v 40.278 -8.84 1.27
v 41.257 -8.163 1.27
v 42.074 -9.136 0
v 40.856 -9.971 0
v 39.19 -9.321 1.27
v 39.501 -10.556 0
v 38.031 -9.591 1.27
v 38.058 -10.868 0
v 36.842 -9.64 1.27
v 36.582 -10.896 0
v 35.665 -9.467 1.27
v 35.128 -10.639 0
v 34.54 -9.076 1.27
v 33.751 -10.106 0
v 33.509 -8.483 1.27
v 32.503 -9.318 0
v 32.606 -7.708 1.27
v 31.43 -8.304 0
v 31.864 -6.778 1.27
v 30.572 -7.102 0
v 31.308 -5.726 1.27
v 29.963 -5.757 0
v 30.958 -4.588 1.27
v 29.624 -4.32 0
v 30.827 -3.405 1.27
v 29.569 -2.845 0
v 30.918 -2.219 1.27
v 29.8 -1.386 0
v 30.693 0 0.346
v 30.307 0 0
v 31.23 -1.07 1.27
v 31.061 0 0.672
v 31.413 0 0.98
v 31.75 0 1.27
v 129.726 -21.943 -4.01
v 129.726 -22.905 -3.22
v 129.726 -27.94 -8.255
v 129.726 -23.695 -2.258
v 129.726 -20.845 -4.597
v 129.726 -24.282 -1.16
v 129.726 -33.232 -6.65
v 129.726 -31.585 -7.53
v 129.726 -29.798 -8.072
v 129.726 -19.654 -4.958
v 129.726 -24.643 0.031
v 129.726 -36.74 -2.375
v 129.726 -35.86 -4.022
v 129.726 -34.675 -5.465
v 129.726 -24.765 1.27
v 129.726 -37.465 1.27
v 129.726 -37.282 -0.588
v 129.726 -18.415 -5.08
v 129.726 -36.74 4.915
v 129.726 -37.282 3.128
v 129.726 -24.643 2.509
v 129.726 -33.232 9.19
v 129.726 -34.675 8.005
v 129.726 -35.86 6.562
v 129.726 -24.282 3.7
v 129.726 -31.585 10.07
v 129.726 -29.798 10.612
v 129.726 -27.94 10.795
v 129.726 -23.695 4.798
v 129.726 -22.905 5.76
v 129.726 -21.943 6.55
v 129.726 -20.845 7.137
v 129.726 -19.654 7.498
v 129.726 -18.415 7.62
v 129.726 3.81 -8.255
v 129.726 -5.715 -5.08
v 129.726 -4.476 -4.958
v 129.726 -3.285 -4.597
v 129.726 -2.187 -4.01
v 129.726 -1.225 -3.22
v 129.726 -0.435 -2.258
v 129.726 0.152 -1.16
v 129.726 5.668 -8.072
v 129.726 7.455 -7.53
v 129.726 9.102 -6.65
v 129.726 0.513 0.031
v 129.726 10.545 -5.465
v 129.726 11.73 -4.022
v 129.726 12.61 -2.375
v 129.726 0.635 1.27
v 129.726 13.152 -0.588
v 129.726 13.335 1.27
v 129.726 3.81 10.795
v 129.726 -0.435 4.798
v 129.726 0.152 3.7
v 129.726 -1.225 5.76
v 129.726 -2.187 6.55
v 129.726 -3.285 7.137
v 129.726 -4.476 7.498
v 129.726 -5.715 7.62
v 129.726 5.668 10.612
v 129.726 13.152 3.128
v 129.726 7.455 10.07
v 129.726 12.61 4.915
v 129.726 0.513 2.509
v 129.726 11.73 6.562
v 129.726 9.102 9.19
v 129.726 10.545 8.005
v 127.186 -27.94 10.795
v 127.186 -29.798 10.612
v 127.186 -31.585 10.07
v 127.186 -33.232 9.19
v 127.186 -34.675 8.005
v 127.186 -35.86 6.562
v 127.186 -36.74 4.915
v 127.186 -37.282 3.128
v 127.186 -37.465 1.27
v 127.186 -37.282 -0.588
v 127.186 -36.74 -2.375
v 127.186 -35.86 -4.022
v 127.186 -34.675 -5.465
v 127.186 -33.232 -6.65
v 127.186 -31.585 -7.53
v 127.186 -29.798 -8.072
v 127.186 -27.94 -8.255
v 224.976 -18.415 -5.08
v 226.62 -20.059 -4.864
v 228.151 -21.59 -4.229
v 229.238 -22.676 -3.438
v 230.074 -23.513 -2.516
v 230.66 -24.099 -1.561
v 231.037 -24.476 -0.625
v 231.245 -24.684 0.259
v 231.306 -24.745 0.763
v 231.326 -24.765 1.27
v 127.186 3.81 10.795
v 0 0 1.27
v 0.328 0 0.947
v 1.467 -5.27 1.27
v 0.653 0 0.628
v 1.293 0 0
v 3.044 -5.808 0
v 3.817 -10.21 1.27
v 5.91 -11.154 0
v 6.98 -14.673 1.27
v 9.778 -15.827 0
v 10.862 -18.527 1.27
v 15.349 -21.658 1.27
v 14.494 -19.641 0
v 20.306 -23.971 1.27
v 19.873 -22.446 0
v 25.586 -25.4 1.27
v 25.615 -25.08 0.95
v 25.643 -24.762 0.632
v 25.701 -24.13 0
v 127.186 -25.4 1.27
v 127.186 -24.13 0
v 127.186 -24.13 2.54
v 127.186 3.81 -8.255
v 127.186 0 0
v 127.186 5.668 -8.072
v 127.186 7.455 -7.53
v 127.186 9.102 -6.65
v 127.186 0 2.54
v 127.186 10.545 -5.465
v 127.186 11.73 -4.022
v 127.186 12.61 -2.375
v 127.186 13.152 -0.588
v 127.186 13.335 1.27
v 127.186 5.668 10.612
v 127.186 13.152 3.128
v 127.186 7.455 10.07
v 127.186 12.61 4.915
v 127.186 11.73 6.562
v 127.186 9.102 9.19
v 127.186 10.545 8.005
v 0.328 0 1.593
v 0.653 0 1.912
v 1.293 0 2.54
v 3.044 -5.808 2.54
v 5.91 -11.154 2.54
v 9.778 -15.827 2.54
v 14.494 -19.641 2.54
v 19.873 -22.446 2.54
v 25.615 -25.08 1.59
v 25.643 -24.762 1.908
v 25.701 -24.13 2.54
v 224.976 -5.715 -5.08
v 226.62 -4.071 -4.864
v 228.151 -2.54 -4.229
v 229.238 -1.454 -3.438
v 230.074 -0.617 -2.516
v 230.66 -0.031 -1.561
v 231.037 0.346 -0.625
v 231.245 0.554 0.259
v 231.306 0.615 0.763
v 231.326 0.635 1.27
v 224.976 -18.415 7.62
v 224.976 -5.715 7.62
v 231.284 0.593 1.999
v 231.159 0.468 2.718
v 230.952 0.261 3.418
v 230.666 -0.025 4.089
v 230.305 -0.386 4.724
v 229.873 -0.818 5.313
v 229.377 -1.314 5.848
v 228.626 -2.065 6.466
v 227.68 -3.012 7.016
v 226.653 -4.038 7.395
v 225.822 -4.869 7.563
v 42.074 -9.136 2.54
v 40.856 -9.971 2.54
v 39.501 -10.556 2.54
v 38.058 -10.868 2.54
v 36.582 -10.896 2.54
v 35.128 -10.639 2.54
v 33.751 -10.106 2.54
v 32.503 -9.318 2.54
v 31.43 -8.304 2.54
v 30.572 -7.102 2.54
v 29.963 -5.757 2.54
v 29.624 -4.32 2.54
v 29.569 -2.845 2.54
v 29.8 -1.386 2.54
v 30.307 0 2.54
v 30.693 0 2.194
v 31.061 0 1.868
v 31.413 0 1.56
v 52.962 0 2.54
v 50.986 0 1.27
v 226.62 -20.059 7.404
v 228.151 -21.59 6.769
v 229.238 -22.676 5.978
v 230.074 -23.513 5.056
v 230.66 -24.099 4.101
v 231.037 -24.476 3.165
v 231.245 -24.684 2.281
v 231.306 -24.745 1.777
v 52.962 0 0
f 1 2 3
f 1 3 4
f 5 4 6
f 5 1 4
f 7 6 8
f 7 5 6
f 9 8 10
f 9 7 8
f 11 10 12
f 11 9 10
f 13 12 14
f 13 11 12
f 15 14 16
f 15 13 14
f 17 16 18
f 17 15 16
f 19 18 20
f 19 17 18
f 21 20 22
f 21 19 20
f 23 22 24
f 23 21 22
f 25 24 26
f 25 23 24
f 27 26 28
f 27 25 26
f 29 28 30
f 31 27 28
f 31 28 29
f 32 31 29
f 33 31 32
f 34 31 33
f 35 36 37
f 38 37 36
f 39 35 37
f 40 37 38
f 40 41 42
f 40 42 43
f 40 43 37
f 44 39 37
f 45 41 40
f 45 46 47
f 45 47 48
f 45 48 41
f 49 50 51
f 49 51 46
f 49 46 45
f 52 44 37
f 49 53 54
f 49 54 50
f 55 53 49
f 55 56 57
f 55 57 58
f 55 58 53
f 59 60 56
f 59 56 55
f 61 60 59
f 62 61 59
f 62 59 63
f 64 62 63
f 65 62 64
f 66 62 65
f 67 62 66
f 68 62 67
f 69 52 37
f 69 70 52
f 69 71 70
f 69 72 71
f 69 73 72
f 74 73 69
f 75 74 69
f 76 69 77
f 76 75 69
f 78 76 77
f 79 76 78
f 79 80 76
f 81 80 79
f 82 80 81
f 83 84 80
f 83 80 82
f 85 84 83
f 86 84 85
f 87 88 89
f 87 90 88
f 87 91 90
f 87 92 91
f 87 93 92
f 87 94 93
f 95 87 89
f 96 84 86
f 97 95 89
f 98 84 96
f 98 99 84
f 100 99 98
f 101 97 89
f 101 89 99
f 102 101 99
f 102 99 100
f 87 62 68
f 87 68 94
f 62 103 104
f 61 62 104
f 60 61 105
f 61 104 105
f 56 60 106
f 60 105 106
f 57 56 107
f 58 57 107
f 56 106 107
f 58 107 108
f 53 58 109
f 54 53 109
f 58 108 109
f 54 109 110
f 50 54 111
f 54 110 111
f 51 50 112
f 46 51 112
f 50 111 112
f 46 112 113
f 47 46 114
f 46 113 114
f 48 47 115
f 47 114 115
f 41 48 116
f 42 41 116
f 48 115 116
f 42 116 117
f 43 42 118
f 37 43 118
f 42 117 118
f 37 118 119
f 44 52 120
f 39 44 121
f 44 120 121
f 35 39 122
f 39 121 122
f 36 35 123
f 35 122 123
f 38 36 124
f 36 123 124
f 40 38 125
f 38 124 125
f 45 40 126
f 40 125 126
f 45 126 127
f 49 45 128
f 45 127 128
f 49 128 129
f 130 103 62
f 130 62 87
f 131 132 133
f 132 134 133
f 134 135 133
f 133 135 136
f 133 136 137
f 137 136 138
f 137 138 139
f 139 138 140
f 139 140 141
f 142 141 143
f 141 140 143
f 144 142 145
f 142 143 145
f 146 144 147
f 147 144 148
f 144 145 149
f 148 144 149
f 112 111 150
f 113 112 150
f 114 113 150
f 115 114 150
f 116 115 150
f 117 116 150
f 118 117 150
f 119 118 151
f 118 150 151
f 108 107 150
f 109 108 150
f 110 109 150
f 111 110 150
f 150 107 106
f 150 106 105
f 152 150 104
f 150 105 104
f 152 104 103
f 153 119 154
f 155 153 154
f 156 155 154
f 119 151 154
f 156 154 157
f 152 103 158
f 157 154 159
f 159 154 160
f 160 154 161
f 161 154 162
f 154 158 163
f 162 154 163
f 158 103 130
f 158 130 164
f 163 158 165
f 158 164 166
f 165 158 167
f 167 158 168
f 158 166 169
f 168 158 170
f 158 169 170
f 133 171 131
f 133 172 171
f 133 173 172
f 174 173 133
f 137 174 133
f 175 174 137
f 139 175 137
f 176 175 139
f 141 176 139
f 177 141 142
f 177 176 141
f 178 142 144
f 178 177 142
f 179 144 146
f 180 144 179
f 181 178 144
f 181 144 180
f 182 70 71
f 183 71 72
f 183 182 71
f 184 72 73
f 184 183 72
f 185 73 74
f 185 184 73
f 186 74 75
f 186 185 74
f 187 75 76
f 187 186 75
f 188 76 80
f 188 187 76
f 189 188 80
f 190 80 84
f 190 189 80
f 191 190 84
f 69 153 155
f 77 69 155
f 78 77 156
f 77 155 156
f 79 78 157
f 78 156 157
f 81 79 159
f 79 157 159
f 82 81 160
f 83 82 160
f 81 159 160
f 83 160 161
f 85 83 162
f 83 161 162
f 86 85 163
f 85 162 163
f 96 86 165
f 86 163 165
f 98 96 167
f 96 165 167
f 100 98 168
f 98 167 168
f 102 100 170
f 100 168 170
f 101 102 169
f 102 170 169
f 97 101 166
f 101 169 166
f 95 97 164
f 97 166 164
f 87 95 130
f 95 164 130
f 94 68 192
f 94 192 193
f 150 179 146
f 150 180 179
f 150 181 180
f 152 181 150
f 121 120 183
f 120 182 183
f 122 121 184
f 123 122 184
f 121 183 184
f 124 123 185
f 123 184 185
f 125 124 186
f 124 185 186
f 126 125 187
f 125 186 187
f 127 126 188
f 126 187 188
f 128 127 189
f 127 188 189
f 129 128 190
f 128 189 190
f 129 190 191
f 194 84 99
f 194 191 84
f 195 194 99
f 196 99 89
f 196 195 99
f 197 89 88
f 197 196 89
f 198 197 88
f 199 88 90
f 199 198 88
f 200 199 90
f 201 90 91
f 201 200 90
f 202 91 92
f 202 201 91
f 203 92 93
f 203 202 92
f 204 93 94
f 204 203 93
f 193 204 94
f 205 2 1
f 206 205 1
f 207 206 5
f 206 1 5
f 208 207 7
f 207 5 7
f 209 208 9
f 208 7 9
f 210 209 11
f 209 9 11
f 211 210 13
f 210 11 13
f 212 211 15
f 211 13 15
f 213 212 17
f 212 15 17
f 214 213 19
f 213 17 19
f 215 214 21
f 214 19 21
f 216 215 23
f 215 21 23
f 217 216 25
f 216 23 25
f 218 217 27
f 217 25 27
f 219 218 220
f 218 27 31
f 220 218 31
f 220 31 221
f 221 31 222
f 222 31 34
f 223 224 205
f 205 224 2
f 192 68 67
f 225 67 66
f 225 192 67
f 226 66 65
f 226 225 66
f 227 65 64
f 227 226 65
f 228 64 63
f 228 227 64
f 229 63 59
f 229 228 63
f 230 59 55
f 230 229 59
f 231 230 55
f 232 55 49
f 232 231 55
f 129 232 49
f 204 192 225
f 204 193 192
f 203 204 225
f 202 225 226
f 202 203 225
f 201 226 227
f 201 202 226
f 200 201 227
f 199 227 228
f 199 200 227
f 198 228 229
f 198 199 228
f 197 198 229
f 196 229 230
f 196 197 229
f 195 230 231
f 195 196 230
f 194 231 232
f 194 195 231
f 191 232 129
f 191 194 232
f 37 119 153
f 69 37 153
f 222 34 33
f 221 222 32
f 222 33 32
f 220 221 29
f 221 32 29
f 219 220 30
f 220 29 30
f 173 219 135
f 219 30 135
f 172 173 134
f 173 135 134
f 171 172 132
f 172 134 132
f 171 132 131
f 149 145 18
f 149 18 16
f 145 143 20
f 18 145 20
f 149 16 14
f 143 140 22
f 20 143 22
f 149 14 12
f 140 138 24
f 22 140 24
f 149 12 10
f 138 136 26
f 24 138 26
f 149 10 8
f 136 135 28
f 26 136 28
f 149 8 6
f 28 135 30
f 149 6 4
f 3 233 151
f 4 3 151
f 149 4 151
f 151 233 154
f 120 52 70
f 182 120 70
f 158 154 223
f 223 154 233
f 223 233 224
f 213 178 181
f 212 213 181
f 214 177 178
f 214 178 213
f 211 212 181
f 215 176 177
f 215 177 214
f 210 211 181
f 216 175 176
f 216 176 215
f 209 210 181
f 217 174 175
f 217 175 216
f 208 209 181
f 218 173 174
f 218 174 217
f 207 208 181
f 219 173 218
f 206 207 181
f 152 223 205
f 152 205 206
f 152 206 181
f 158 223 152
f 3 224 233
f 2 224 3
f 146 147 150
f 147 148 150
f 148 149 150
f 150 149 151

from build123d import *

# Parameters (mm, degrees)
F1_DEPTH   = 2.54
F2_C1_SIZE = 1.27
F2_C2_SIZE = 1.2699
F2_C3_SIZE = 1.27
F2_C4_SIZE = 1.2699
F3_SIZE    = 1.26999
F4_W       = 31.75
F4_H       = 19.05
F5_DEPTH   = 2.54
F6_W       = 25.4
F6_H       = 12.7
F7_DEPTH   = 101.6
F8_R       = 6.34999


# Not quite as in the source:
# - a fillet or chamfer is up to 0.001 mm smaller than in the source, because OpenCascade refuses the exact size


with BuildPart() as f1:
    # F0 (on Top) → F1 (new body)
    with BuildSketch(Plane.XY):
        with BuildLine():
            Line((31.75, 0), (0, 0))
            ThreePointArc((0, 0), (8.8381906554, -16.6839242395), (25.5862342852, -25.4))
            Line((25.5862342852, -25.4), (127.1862342852, -25.4))
            Line((127.1862342852, -25.4), (127.1862342852, 0))
            Line((127.1862342852, 0), (50.9862342852, 0))
            Line((50.9862342852, 0), (41.2574698576, -8.163402643))
            ThreePointArc((41.2574698576, -8.163402643), (33.0391135049, -8.1167569468), (31.75, 0))
        make_face()
    extrude(amount=F1_DEPTH)

    # F2: chamfer of 1.27 on 4 edges, made by hand

    # F2_c1
    f2_c1_edges = [f1.edges().sort_by_distance(p)[0] for p in [
        (76.3862342852, -25.4, 0),
    ]]
    chamfer(f2_c1_edges, length=F2_C1_SIZE)

    # F2_c2 (size 1.27 in the source; OpenCascade refuses exactly that, so slightly less here)
    f2_c2_edges = [f1.edges().sort_by_distance(p)[0] for p in [
        (76.3862342852, -25.4, 2.54),
    ]]
    chamfer(f2_c2_edges, length=F2_C2_SIZE)

    # F2_c3
    f2_c3_edges = [f1.edges().sort_by_distance(p)[0] for p in [
        (7.1332744951, -14.8524871452, 0),
    ]]
    chamfer(f2_c3_edges, length=F2_C3_SIZE)

    # F2_c4 (size 1.27 in the source; OpenCascade refuses exactly that, so slightly less here)
    f2_c4_edges = [f1.edges().sort_by_distance(p)[0] for p in [
        (7.133373479, -14.8526022537, 2.54),
    ]]
    chamfer(f2_c4_edges, length=F2_C4_SIZE)

    # F3 (size 1.27 in the source; OpenCascade refuses exactly that, so slightly less here)
    f3_edges = [f1.edges().sort_by_distance(p)[0] for p in [
        (33.039114, -8.116757, 0),
        (33.039114, -8.116757, 2.54),
        (46.121852, -4.081701, 0),
        (46.121852, -4.081701, 2.54),
    ]]
    chamfer(f3_edges, length=F3_SIZE)

    # F4 (on face) → F5 (join)
    with BuildSketch(Plane.YZ.offset(127.1862342852)):
        with Locations((-12.065, 1.27)):
            Rectangle(F4_W, F4_H)
        with BuildLine():
            ThreePointArc((3.81, -8.255), (13.335, 1.27), (3.81, 10.795))
            Line((3.81, 10.795), (3.81, -8.255))
        make_face()
        with BuildLine():
            Line((-27.94, -8.255), (-27.94, 10.795))
            ThreePointArc((-27.94, 10.795), (-37.465, 1.27), (-27.94, -8.255))
        make_face()
    extrude(amount=F5_DEPTH)

    # F6 (on face) → F7 (join)
    with BuildSketch(Plane.YZ.offset(129.7262342852)):
        with Locations((-12.065, 1.27)):
            Rectangle(F6_W, F6_H)
    extrude(amount=F7_DEPTH)

    # F8 (radius 6.35 in the source; OpenCascade refuses exactly that, so slightly less here)
    f8_edges = [f1.edges().sort_by_distance(p)[0] for p in [
        (180.526234, 0.635, 7.62),
        (180.526234, 0.635, -5.08),
        (180.526234, -24.765, -5.08),
        (180.526234, -24.765, 7.62),
        (231.326234, -12.065, 7.62),
        (231.326234, -12.065, -5.08),
    ]]
    fillet(f8_edges, radius=F8_R)


solid = f1.part
